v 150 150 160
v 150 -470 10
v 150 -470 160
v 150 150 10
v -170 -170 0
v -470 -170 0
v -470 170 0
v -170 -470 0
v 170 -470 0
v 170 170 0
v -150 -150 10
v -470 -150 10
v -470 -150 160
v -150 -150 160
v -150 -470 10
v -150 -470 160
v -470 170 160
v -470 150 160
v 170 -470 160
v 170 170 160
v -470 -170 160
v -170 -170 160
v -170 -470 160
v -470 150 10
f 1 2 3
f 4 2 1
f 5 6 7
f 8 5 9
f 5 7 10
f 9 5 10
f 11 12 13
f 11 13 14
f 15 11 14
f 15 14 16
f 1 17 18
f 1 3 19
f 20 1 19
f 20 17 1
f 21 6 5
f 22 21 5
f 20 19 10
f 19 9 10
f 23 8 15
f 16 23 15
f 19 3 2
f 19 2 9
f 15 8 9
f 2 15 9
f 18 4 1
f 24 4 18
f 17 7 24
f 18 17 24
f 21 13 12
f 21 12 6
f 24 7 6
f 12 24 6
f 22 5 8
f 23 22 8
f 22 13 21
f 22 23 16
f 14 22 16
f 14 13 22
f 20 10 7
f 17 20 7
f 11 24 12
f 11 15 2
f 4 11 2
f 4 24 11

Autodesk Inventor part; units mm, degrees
ref_plane "YZ Plane" through (0, 0, 0) normal (1, 0, 0) x (0, 1, 0)
ref_plane "XZ Plane" through (0, 0, 0) normal (0, 1, 0) x (-1, 0, 0)
ref_plane "XY Plane" through (0, 0, 0) normal (0, 0, 1) x (1, 0, 0)
sketch "Эскиз1" plane through (0, 0, 0) normal (0, 0, 1) x (1, 0, 0)
  line L0 (150, 150) -> (-150, 150)
  line L1 (-150, 150) -> (-150, -150)
  line L2 (-150, -150) -> (150, -150)
  line L3 (150, -150) -> (150, 150)
  line L4 (150, 150) -> (-150, -150) construction
  line L5 (-150, 150) -> (150, -150) construction
  line L6 (-450, 150) -> (-150, 150)
  line L7 (-150, 150) -> (-150, -150)
  line L8 (-150, -150) -> (-450, -150)
  line L9 (-450, -150) -> (-450, 150)
  line L10 (-450, 150) -> (-150, -150) construction
  line L11 (-150, 150) -> (-450, -150) construction
  line L12 (150, -150) -> (-150, -150)
  line L13 (-150, -150) -> (-150, -450)
  line L14 (-150, -450) -> (150, -450)
  line L15 (150, -450) -> (150, -150)
  line L16 (150, -150) -> (-150, -450) construction
  line L17 (-150, -150) -> (150, -450) construction
  line L18 (170, 170) -> (-170, 170)
  line L19 (-170, 170) -> (-170, -170)
  line L20 (-170, -170) -> (170, -170)
  line L21 (170, -170) -> (170, 170)
  line L22 (170, -130) -> (-170, -130)
  line L23 (-170, -130) -> (-170, -470)
  line L24 (-170, -470) -> (170, -470)
  line L25 (170, -470) -> (170, -130)
  line L26 (-470, -170) -> (-130, -170)
  line L27 (-130, -170) -> (-130, 170)
  line L28 (-130, 170) -> (-470, 170)
  line L29 (-470, 170) -> (-470, -170)
  point P0 (0, 0)
  point P1 (-300, 0)
  point P2 (0, -300)
  point P3 (-170, 170)
  point P4 (170, -170)
  dimension "d0" = 300
  dimension "d1" = 300
  dimension "d2" = 300
  dimension "d3" = 300
  dimension "d4" = 300
  dimension "d5" = 300
  dimension "d6" = 20
  dimension "d7" = 20
  dimension "d8" = 20
extrude "Выдавливание1" add sketch "Эскиз1" along normal blind 10
sketch "Эскиз2" plane through (0, 0, 10) normal (0, 0, 1) x (1, 0, 0)
  line L0 (170, 170) -> (-470, 170) projected
  line L1 (-470, 170) -> (-470, -170) projected
  line L2 (-470, -170) -> (-170, -170) projected
  line L3 (-170, -170) -> (-170, -470) projected
  line L4 (-170, -470) -> (170, -470) projected
  line L5 (170, -470) -> (170, 170) projected
  line L6 (150, 150) -> (-450, 150)
  line L7 (-450, 150) -> (-450, -150)
  line L8 (-450, -150) -> (-150, -150)
  line L9 (-150, -150) -> (-150, -450)
  line L10 (-150, -450) -> (150, -450)
  line L11 (150, -450) -> (150, 150)
  line L12 (-170, -470) -> (170, -470) projected
  line L13 (150, -450) -> (-150, -450)
  line L14 (-150, -450) -> (-150, -470)
  line L15 (-150, -470) -> (150, -470)
  line L16 (150, -470) -> (150, -450)
  line L17 (-470, 170) -> (-470, -170) projected
  line L18 (-450, 150) -> (-470, 150)
  line L19 (-470, 150) -> (-470, -150)
  line L20 (-470, -150) -> (-450, -150)
  line L21 (-450, -150) -> (-450, 150)
  point P0 (0, 0)
  dimension "d11" = 20
extrude "Выдавливание2" add sketch "Эскиз2" along normal blind 150 contours L5 L4 L16 L11 L6 L18 L1 L0 | L20 L8 L9 L14 L4 L3 L2 L1
sketch "Эскиз3" plane through (-470, 150, 10) normal (0, -1, 0) x (1, 0, 0)
  line L0 (620, 0) -> (0, 0) projected
  line L1 (620, 0) -> (620, 150) projected
  line L2 (0, 150) -> (620, 150) projected
  line L3 (0, 0) -> (0, 150) projected
  line L4 (620, 0) -> (620, 150) projected
  line L5 (620, 70) -> (0, 70)
  line L6 (0, 0) -> (0, 150) projected
  line L7 (620, 30) -> (0, 30)
  line L8 (620, 110) -> (0, 110)
  point P0 (470, -10)
  dimension "d14" = 70
  dimension "d15" = 40
  dimension "d16" = 40
properties part number "labik"
